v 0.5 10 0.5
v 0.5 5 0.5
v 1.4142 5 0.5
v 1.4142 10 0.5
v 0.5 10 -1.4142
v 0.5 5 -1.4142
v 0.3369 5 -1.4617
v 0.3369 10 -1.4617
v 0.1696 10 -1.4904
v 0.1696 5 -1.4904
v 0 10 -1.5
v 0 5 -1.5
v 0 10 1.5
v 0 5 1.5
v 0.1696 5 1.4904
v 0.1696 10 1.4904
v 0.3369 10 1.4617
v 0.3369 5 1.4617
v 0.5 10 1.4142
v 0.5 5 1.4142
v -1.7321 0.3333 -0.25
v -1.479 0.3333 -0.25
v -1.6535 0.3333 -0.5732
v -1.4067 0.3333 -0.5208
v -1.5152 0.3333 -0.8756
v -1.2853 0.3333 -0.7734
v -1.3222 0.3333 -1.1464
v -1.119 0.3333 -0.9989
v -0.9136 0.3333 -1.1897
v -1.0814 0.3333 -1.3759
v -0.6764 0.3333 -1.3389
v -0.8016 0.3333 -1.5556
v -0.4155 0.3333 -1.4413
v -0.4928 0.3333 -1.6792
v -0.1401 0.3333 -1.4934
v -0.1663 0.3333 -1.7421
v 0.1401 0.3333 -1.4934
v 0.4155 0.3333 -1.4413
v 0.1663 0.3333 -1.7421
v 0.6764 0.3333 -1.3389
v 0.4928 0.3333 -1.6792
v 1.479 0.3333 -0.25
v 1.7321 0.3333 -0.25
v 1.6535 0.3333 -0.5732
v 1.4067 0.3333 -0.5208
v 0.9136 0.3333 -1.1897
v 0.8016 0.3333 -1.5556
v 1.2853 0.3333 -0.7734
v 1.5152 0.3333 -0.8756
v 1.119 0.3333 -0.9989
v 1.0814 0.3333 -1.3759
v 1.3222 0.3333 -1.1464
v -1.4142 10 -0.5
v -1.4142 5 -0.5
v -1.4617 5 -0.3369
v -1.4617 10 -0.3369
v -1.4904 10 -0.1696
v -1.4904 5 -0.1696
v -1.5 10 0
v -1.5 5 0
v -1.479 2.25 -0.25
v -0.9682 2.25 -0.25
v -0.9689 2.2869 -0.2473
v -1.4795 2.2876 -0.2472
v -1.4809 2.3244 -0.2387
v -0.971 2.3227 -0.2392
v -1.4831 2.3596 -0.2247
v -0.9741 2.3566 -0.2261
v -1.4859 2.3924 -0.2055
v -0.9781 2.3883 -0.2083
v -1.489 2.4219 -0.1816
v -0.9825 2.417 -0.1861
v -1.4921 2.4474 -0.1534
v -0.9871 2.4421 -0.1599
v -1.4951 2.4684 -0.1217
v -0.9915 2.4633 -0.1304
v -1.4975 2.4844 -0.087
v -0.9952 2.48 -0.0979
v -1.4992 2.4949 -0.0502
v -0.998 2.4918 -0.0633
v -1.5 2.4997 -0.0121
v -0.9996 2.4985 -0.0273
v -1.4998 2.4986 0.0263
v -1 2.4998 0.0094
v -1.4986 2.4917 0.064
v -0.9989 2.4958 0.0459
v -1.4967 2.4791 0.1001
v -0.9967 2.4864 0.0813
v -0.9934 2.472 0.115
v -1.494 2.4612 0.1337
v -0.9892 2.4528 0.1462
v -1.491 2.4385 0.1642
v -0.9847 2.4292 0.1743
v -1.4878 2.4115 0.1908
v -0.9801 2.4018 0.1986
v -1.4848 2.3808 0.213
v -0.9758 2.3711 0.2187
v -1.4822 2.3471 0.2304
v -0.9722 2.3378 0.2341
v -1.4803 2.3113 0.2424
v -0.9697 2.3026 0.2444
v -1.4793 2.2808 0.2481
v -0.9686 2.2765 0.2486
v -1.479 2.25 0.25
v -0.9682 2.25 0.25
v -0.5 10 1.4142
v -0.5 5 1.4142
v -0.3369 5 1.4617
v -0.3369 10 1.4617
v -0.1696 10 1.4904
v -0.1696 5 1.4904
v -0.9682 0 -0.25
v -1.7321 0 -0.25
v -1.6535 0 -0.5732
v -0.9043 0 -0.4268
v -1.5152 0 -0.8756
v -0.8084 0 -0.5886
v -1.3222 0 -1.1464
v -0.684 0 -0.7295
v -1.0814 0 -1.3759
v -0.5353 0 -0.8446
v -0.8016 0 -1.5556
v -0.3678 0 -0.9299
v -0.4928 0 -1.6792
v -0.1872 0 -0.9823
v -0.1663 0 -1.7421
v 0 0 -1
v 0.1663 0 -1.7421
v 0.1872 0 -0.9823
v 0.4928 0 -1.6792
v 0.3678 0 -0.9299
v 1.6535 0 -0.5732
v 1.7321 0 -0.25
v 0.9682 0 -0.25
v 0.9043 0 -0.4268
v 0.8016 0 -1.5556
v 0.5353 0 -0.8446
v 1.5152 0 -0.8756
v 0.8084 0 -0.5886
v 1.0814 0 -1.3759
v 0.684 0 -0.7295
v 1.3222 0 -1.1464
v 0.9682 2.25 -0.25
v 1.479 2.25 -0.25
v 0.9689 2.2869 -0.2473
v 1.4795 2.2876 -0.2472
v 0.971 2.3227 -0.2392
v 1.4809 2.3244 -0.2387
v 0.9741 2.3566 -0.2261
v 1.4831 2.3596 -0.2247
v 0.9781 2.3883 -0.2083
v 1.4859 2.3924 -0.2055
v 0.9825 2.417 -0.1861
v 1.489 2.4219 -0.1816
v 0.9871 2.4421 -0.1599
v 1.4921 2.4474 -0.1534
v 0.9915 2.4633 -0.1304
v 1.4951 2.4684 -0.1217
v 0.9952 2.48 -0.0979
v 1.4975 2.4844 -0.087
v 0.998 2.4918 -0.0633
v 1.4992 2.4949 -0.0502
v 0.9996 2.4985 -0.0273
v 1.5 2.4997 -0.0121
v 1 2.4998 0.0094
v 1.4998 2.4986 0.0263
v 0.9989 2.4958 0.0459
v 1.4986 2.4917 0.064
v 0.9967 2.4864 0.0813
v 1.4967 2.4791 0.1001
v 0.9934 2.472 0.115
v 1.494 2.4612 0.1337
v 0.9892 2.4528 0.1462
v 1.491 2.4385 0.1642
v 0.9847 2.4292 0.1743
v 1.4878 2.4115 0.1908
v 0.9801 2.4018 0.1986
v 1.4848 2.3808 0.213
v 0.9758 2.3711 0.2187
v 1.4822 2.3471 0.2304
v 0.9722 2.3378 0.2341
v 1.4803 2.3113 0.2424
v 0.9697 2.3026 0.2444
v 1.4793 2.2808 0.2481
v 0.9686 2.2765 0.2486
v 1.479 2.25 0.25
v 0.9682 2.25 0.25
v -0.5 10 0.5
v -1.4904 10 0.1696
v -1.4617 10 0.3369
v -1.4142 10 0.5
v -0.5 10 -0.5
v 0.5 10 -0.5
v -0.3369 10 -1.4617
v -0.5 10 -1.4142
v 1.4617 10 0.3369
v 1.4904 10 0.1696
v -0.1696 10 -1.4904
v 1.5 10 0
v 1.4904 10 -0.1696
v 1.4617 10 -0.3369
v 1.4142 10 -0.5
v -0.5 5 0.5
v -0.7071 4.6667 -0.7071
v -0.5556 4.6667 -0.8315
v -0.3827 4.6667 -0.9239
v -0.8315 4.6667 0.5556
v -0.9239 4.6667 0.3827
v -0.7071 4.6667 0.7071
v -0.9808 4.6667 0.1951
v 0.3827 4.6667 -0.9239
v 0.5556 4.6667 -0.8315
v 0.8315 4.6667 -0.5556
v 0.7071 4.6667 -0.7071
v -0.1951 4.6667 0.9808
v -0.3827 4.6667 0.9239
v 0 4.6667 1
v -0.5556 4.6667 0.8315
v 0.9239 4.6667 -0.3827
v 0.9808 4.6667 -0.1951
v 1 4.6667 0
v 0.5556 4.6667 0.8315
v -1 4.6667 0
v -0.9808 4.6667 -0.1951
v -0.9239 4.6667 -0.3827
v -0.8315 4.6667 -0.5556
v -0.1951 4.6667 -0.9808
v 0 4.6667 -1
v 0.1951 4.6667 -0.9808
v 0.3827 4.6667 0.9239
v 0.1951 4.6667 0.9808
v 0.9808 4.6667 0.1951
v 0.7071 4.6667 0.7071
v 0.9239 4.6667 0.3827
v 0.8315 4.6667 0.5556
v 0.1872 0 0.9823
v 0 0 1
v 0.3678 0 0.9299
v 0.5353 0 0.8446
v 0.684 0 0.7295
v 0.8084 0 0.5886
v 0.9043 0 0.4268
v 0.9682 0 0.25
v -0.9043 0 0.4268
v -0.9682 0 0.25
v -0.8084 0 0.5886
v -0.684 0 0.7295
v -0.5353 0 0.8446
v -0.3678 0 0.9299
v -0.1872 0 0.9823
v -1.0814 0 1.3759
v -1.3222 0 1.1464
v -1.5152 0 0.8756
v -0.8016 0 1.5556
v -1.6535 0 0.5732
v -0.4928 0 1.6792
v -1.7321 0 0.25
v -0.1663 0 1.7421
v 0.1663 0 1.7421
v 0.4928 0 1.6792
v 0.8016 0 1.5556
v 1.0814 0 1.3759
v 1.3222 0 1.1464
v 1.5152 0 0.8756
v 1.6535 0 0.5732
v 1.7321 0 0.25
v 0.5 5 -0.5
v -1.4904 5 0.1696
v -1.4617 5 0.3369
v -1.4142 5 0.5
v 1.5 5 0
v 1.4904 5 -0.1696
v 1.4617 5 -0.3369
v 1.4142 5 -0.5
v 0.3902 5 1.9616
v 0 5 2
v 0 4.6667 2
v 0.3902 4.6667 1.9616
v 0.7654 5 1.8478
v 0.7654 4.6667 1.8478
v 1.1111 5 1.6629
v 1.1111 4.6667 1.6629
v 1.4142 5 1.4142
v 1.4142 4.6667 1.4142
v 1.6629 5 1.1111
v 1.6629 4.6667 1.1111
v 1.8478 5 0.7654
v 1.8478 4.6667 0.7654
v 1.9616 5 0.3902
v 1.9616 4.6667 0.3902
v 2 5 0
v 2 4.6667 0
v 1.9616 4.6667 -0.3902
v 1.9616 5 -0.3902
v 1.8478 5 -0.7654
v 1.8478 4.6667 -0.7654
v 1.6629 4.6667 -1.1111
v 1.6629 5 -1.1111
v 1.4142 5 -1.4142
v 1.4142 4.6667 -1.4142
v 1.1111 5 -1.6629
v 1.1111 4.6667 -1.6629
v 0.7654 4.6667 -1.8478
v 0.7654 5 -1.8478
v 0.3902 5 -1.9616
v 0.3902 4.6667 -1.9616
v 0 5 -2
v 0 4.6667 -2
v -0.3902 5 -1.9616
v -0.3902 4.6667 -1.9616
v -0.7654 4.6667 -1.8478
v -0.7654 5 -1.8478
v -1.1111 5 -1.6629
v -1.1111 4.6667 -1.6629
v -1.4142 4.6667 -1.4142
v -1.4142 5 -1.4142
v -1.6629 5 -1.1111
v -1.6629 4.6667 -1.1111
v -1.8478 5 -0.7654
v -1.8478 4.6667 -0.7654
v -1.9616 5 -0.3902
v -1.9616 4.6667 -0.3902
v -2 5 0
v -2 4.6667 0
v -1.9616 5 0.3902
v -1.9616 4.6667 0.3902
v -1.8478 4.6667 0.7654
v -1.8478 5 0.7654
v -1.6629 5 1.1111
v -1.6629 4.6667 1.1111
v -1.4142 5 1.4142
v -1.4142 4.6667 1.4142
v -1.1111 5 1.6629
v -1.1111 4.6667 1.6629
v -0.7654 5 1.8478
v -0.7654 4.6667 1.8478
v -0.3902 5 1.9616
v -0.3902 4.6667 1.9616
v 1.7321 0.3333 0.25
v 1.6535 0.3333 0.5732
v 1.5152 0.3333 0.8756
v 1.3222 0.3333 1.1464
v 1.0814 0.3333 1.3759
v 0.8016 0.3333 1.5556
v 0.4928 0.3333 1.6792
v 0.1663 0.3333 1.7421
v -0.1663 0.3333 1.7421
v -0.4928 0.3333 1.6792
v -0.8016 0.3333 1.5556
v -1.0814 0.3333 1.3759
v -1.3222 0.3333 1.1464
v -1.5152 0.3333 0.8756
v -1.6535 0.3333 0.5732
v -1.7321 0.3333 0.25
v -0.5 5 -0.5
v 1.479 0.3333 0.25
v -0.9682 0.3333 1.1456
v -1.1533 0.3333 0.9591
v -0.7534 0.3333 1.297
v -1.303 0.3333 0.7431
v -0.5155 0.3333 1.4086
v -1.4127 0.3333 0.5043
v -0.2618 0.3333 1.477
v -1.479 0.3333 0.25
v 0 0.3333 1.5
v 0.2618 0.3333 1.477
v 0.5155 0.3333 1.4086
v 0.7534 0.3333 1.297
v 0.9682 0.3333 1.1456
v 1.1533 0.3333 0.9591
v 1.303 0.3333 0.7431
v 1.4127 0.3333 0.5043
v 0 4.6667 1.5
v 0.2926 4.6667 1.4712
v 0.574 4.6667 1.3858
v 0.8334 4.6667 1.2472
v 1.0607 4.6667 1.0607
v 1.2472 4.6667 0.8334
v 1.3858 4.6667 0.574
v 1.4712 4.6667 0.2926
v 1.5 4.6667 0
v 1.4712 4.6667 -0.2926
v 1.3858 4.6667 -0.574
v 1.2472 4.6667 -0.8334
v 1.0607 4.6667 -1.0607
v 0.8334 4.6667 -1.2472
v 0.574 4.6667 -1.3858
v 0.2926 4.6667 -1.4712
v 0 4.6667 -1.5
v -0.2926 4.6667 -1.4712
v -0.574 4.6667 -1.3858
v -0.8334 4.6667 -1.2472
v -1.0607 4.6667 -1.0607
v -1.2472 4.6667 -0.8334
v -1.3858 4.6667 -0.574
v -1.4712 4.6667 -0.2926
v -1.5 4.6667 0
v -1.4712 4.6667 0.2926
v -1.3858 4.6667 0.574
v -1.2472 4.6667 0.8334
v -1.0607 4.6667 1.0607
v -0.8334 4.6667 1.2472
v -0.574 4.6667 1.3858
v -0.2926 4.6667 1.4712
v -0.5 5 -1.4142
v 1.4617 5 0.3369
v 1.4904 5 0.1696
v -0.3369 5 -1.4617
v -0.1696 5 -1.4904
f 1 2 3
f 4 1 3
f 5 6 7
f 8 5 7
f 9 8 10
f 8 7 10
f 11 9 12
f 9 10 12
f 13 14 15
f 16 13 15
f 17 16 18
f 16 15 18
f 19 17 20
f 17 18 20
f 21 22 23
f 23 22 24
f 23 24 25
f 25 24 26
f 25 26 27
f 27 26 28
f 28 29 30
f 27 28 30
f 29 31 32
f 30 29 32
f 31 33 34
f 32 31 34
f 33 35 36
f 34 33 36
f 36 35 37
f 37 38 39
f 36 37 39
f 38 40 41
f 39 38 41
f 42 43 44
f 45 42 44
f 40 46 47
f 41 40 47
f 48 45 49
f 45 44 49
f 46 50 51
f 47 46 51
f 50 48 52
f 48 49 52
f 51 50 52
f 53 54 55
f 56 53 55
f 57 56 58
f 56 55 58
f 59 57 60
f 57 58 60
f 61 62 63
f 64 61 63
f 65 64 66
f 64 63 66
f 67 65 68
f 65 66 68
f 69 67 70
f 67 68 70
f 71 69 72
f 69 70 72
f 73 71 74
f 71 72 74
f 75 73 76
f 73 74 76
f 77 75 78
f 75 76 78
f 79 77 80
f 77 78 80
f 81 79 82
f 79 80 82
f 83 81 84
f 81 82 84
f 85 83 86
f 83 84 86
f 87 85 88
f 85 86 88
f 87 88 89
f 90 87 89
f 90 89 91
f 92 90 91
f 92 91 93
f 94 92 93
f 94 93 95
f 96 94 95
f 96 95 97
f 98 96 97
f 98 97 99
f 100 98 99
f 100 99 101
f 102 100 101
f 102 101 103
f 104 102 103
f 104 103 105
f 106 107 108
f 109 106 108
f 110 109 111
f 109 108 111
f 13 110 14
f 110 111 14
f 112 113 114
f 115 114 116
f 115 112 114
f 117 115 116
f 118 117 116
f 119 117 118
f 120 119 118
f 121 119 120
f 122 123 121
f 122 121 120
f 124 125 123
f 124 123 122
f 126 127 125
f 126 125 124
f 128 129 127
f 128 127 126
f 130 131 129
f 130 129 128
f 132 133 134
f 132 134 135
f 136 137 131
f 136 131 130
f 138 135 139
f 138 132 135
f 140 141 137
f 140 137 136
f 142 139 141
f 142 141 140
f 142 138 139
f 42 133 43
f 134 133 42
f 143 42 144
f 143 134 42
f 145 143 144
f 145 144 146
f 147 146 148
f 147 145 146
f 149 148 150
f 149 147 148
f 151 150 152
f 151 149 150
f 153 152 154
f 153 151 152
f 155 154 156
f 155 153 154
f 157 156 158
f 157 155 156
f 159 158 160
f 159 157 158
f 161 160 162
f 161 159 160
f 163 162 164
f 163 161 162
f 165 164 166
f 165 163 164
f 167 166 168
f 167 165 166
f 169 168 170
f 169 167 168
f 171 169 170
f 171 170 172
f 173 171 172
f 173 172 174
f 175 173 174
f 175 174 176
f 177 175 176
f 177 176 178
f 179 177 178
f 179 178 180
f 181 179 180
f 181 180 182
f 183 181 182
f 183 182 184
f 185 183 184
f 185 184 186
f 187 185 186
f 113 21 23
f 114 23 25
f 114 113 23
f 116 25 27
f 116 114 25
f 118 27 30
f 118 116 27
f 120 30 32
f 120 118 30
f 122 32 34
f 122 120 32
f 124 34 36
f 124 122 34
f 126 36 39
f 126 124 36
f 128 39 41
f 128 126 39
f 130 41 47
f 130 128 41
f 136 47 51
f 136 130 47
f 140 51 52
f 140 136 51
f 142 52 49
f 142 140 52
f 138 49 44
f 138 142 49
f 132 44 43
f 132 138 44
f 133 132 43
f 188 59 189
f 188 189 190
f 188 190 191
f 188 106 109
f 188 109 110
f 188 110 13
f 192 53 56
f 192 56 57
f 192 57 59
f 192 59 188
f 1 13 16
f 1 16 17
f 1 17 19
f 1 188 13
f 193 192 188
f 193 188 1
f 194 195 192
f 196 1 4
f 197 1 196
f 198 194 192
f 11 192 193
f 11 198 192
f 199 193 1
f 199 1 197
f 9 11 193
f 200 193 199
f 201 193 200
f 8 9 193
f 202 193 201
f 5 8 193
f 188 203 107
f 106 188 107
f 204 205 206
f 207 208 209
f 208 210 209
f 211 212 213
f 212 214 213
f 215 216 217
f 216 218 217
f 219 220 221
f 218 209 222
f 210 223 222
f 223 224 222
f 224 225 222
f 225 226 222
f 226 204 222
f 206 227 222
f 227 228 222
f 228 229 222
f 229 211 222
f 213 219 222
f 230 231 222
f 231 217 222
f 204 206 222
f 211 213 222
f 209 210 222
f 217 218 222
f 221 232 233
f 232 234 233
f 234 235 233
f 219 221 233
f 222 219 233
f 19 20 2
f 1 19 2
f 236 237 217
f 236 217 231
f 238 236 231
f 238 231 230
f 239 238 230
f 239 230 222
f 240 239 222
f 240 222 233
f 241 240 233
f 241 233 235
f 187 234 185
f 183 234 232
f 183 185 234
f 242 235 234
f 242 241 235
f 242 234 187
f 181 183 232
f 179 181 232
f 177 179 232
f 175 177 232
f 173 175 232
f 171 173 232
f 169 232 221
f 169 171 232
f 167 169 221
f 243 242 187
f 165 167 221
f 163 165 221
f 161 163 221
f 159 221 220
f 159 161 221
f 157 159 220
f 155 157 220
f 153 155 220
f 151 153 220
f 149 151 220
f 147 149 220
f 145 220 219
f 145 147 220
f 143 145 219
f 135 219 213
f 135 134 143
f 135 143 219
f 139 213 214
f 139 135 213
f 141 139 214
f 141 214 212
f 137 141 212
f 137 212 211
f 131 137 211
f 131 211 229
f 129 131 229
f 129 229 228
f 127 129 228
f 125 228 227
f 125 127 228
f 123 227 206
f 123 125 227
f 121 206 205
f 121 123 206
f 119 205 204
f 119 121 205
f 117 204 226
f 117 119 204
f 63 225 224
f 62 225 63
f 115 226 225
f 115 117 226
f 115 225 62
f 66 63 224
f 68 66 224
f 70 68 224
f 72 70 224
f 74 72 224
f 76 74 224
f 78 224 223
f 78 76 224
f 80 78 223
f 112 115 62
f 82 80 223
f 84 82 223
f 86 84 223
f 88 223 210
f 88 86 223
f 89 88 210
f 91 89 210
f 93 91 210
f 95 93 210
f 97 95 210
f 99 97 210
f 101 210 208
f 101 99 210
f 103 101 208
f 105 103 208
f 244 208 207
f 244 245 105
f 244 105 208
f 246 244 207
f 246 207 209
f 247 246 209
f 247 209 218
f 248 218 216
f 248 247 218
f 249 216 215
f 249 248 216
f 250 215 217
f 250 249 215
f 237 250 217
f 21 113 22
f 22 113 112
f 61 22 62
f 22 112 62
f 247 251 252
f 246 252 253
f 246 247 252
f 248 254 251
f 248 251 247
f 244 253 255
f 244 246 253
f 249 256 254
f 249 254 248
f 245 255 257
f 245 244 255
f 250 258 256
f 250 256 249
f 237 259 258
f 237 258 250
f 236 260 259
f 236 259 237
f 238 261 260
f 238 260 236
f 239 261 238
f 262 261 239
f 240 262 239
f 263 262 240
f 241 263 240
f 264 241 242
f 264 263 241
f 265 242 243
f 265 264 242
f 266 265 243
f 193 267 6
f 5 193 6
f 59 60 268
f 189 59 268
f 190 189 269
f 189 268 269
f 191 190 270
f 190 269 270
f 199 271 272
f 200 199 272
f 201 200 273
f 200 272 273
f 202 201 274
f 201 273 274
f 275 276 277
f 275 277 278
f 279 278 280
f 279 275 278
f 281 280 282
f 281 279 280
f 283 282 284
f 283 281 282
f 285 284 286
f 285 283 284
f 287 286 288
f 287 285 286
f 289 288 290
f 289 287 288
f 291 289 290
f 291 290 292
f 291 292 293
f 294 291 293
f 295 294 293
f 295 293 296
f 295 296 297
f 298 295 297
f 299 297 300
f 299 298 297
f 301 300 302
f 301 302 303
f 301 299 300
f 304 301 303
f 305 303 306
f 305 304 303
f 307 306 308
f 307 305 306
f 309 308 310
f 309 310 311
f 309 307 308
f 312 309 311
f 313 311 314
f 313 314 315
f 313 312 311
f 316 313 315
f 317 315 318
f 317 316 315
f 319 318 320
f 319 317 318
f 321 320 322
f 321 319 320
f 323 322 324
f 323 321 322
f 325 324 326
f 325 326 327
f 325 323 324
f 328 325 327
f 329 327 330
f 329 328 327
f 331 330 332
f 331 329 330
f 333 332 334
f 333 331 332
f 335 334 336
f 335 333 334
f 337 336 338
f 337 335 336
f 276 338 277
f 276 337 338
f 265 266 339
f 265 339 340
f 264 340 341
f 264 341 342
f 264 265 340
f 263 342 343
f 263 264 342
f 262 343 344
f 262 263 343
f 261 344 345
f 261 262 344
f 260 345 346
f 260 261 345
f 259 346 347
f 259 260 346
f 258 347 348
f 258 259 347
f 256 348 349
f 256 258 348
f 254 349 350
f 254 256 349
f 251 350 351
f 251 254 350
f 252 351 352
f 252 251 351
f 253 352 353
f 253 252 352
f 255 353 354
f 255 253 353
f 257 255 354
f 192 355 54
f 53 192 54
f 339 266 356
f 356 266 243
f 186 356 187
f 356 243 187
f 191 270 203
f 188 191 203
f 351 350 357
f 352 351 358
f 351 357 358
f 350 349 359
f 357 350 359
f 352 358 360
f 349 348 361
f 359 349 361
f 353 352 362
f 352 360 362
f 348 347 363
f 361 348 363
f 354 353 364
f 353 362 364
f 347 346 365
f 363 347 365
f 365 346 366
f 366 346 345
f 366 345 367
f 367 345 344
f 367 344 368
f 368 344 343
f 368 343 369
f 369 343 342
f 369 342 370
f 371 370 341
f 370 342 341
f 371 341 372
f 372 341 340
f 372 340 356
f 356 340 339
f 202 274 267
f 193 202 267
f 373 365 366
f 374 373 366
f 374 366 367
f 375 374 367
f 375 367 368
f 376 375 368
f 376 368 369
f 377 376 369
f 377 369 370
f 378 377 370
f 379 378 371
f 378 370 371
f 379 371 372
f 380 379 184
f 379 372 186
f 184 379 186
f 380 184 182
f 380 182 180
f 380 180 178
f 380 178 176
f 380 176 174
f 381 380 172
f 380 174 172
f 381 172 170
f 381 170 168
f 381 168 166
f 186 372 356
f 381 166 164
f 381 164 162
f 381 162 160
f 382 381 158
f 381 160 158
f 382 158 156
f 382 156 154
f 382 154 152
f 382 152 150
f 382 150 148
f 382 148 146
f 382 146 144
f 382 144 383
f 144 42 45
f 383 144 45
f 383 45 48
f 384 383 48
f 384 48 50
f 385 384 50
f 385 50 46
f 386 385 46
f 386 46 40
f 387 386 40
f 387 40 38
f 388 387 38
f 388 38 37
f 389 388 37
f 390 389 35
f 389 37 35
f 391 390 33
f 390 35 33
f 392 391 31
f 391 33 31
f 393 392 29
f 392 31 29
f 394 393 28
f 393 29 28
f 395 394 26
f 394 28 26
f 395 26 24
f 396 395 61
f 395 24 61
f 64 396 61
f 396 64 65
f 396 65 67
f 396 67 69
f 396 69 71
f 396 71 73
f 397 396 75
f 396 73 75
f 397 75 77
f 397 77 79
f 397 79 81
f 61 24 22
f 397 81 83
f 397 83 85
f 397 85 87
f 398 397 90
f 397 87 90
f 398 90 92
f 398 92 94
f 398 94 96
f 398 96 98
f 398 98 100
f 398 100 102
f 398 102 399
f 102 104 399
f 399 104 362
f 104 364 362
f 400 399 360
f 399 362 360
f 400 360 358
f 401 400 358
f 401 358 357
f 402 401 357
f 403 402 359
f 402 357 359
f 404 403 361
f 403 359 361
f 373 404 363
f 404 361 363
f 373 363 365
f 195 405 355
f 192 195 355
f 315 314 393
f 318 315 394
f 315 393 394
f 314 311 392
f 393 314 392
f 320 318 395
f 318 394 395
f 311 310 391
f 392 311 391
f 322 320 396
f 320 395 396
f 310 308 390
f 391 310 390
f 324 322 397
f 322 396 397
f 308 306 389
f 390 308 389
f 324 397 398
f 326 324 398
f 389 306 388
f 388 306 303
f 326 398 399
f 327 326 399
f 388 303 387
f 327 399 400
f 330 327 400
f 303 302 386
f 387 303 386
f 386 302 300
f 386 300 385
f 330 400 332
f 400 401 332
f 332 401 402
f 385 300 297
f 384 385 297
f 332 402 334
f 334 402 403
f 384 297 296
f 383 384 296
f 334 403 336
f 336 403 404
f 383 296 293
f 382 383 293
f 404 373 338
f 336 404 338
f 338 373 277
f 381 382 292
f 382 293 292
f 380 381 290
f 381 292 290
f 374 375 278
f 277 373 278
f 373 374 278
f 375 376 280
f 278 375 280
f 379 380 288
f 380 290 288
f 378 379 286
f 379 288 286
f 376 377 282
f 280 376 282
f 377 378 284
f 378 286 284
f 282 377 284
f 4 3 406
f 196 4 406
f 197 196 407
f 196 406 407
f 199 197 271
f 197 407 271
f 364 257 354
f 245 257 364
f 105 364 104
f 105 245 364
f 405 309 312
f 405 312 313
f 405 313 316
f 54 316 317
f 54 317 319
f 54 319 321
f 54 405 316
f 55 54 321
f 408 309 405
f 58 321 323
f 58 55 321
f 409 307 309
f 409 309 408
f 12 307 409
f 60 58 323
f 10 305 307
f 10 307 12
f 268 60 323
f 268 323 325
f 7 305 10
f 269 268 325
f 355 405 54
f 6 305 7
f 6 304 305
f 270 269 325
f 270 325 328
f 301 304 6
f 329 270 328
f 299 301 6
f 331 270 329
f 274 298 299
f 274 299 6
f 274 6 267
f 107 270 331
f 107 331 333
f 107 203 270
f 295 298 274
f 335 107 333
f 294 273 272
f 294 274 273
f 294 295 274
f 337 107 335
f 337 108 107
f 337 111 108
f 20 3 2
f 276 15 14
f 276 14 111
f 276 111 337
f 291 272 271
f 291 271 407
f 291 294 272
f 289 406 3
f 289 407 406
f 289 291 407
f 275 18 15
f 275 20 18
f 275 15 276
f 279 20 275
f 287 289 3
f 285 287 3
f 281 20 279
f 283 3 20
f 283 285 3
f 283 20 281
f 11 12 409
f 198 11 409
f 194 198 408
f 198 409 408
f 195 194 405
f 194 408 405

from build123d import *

# Parameters (mm, degrees)
SKETCH1_R               = 1.5
SKETCH1_R_2             = 1
BOSS_EXTRUDE1_DEPTH     = 5
SKETCH2_R               = 2
SKETCH2_R_2             = 1.5
SKETCH2_R_3             = 1
BOSS_EXTRUDE2_DEPTH     = 0.333333333
SKETCH3_R               = 1.75
SKETCH3_R_2             = 1
BOSS_EXTRUDE4_DEPTH     = 0.333333333
SKETCH4_R               = 0.25
SKETCH4_W               = 0.5
SKETCH4_H               = 2.25
CUT_EXTRUDE1_DEPTH      = 6.744562647
CUT_EXTRUDE1_DEPTH_BACK = 6.744562647
SKETCH7_W               = 1
SKETCH7_H               = 1
BOSS_EXTRUDE6_DEPTH     = 5


with BuildPart() as part:
    # Sketch1 → Boss-Extrude1 (new body)
    with BuildSketch(Plane(origin=(0, 0, 0), x_dir=(1, 0, 0), z_dir=(0, 1, 0))):
        with Locations(Location((0, 0, 0), (0, 0, 270))):
            Circle(SKETCH1_R)
        with Locations(Location((0, 0, 0), (0, 0, 270))):
            Circle(SKETCH1_R_2, mode=Mode.SUBTRACT)
    extrude(amount=BOSS_EXTRUDE1_DEPTH)

    # Sketch2 → Boss-Extrude2 (add)
    with BuildSketch(Plane(origin=(0, 5, 0), x_dir=(1, 0, 0), z_dir=(0, 1, 0))):
        with Locations(Location((0, 0, 0), (0, 0, 270))):
            Circle(SKETCH2_R)
        with Locations(Location((0, 0, 0), (0, 0, 270))):
            Circle(SKETCH2_R_2, mode=Mode.SUBTRACT)
        with Locations(Location((0, 0, 0), (0, 0, 270))):
            Circle(SKETCH2_R_2)
        with Locations(Location((0, 0, 0), (0, 0, 270))):
            Circle(SKETCH2_R_3, mode=Mode.SUBTRACT)
        with Locations(Location((0, 0, 0), (0, 0, 270))):
            Circle(SKETCH2_R_3)
    extrude(amount=-BOSS_EXTRUDE2_DEPTH)

    # Sketch3 → Boss-Extrude4 (add)
    with BuildSketch(Plane(origin=(0, 0, 0), x_dir=(-1, 0, 0), z_dir=(0, -1, 0))):
        with Locations(Location((0, 0, 0), (0, 0, 90))):
            Circle(SKETCH3_R)
        with Locations(Location((0, 0, 0), (0, 0, 270))):
            Circle(SKETCH3_R_2, mode=Mode.SUBTRACT)
    extrude(amount=-BOSS_EXTRUDE4_DEPTH)

    # Sketch4 → Cut-Extrude1 (cut, two sides)
    with BuildSketch(Plane(origin=(0, 0, 0), x_dir=(0, 0, -1), z_dir=(1, 0, 0))) as cut_extrude1_sk:
        with Locations((0, 2.25)):
            Circle(SKETCH4_R)
        with Locations((0, 1.125)):
            Rectangle(SKETCH4_W, SKETCH4_H)
    extrude(amount=CUT_EXTRUDE1_DEPTH, mode=Mode.SUBTRACT)
    extrude(cut_extrude1_sk.sketch, amount=-CUT_EXTRUDE1_DEPTH_BACK, mode=Mode.SUBTRACT)

    # Sketch7 → Boss-Extrude6 (add)
    with BuildSketch(Plane(origin=(0, 5, 0), x_dir=(1, 0, 0), z_dir=(0, 1, 0))):
        with BuildLine():
            Line((1.414213562, 0.5), (0.5, 0.5))
            Line((0.5, 0.5), (0.5, -0.5))
            Line((0.5, -0.5), (1.414213562, -0.5))
            ThreePointArc((1.414213562, -0.5), (1.478397839, -0.253652968), (1.5, 0))
            ThreePointArc((1.5, 0), (1.478397839, 0.253652968), (1.414213562, 0.5))
        make_face()
        Rectangle(SKETCH7_W, SKETCH7_H)
        with BuildLine():
            Line((0.5, -0.5), (-0.5, -0.5))
            Line((-0.5, -0.5), (-0.5, -1.414213562))
            ThreePointArc((-0.5, -1.414213562), (-0.253652968, -1.478397839), (0, -1.5))
            ThreePointArc((0, -1.5), (0.253652968, -1.478397839), (0.5, -1.414213562))
            Line((0.5, -1.414213562), (0.5, -0.5))
        make_face()
        with BuildLine():
            ThreePointArc((0.5, 1.414213562), (0.253652968, 1.478397839), (0, 1.5))
            ThreePointArc((0, 1.5), (-0.253652968, 1.478397839), (-0.5, 1.414213562))
            Line((-0.5, 1.414213562), (-0.5, 0.5))
            Line((-0.5, 0.5), (0.5, 0.5))
            Line((0.5, 0.5), (0.5, 1.414213562))
        make_face()
        with BuildLine():
            Line((-0.5, -0.5), (-0.5, 0.5))
            Line((-0.5, 0.5), (-1.414213562, 0.5))
            ThreePointArc((-1.414213562, 0.5), (-1.478397839, 0.253652968), (-1.5, 0))
            ThreePointArc((-1.5, 0), (-1.478397839, -0.253652968), (-1.414213562, -0.5))
            Line((-1.414213562, -0.5), (-0.5, -0.5))
        make_face()
    extrude(amount=BOSS_EXTRUDE6_DEPTH)


solid = part.part
